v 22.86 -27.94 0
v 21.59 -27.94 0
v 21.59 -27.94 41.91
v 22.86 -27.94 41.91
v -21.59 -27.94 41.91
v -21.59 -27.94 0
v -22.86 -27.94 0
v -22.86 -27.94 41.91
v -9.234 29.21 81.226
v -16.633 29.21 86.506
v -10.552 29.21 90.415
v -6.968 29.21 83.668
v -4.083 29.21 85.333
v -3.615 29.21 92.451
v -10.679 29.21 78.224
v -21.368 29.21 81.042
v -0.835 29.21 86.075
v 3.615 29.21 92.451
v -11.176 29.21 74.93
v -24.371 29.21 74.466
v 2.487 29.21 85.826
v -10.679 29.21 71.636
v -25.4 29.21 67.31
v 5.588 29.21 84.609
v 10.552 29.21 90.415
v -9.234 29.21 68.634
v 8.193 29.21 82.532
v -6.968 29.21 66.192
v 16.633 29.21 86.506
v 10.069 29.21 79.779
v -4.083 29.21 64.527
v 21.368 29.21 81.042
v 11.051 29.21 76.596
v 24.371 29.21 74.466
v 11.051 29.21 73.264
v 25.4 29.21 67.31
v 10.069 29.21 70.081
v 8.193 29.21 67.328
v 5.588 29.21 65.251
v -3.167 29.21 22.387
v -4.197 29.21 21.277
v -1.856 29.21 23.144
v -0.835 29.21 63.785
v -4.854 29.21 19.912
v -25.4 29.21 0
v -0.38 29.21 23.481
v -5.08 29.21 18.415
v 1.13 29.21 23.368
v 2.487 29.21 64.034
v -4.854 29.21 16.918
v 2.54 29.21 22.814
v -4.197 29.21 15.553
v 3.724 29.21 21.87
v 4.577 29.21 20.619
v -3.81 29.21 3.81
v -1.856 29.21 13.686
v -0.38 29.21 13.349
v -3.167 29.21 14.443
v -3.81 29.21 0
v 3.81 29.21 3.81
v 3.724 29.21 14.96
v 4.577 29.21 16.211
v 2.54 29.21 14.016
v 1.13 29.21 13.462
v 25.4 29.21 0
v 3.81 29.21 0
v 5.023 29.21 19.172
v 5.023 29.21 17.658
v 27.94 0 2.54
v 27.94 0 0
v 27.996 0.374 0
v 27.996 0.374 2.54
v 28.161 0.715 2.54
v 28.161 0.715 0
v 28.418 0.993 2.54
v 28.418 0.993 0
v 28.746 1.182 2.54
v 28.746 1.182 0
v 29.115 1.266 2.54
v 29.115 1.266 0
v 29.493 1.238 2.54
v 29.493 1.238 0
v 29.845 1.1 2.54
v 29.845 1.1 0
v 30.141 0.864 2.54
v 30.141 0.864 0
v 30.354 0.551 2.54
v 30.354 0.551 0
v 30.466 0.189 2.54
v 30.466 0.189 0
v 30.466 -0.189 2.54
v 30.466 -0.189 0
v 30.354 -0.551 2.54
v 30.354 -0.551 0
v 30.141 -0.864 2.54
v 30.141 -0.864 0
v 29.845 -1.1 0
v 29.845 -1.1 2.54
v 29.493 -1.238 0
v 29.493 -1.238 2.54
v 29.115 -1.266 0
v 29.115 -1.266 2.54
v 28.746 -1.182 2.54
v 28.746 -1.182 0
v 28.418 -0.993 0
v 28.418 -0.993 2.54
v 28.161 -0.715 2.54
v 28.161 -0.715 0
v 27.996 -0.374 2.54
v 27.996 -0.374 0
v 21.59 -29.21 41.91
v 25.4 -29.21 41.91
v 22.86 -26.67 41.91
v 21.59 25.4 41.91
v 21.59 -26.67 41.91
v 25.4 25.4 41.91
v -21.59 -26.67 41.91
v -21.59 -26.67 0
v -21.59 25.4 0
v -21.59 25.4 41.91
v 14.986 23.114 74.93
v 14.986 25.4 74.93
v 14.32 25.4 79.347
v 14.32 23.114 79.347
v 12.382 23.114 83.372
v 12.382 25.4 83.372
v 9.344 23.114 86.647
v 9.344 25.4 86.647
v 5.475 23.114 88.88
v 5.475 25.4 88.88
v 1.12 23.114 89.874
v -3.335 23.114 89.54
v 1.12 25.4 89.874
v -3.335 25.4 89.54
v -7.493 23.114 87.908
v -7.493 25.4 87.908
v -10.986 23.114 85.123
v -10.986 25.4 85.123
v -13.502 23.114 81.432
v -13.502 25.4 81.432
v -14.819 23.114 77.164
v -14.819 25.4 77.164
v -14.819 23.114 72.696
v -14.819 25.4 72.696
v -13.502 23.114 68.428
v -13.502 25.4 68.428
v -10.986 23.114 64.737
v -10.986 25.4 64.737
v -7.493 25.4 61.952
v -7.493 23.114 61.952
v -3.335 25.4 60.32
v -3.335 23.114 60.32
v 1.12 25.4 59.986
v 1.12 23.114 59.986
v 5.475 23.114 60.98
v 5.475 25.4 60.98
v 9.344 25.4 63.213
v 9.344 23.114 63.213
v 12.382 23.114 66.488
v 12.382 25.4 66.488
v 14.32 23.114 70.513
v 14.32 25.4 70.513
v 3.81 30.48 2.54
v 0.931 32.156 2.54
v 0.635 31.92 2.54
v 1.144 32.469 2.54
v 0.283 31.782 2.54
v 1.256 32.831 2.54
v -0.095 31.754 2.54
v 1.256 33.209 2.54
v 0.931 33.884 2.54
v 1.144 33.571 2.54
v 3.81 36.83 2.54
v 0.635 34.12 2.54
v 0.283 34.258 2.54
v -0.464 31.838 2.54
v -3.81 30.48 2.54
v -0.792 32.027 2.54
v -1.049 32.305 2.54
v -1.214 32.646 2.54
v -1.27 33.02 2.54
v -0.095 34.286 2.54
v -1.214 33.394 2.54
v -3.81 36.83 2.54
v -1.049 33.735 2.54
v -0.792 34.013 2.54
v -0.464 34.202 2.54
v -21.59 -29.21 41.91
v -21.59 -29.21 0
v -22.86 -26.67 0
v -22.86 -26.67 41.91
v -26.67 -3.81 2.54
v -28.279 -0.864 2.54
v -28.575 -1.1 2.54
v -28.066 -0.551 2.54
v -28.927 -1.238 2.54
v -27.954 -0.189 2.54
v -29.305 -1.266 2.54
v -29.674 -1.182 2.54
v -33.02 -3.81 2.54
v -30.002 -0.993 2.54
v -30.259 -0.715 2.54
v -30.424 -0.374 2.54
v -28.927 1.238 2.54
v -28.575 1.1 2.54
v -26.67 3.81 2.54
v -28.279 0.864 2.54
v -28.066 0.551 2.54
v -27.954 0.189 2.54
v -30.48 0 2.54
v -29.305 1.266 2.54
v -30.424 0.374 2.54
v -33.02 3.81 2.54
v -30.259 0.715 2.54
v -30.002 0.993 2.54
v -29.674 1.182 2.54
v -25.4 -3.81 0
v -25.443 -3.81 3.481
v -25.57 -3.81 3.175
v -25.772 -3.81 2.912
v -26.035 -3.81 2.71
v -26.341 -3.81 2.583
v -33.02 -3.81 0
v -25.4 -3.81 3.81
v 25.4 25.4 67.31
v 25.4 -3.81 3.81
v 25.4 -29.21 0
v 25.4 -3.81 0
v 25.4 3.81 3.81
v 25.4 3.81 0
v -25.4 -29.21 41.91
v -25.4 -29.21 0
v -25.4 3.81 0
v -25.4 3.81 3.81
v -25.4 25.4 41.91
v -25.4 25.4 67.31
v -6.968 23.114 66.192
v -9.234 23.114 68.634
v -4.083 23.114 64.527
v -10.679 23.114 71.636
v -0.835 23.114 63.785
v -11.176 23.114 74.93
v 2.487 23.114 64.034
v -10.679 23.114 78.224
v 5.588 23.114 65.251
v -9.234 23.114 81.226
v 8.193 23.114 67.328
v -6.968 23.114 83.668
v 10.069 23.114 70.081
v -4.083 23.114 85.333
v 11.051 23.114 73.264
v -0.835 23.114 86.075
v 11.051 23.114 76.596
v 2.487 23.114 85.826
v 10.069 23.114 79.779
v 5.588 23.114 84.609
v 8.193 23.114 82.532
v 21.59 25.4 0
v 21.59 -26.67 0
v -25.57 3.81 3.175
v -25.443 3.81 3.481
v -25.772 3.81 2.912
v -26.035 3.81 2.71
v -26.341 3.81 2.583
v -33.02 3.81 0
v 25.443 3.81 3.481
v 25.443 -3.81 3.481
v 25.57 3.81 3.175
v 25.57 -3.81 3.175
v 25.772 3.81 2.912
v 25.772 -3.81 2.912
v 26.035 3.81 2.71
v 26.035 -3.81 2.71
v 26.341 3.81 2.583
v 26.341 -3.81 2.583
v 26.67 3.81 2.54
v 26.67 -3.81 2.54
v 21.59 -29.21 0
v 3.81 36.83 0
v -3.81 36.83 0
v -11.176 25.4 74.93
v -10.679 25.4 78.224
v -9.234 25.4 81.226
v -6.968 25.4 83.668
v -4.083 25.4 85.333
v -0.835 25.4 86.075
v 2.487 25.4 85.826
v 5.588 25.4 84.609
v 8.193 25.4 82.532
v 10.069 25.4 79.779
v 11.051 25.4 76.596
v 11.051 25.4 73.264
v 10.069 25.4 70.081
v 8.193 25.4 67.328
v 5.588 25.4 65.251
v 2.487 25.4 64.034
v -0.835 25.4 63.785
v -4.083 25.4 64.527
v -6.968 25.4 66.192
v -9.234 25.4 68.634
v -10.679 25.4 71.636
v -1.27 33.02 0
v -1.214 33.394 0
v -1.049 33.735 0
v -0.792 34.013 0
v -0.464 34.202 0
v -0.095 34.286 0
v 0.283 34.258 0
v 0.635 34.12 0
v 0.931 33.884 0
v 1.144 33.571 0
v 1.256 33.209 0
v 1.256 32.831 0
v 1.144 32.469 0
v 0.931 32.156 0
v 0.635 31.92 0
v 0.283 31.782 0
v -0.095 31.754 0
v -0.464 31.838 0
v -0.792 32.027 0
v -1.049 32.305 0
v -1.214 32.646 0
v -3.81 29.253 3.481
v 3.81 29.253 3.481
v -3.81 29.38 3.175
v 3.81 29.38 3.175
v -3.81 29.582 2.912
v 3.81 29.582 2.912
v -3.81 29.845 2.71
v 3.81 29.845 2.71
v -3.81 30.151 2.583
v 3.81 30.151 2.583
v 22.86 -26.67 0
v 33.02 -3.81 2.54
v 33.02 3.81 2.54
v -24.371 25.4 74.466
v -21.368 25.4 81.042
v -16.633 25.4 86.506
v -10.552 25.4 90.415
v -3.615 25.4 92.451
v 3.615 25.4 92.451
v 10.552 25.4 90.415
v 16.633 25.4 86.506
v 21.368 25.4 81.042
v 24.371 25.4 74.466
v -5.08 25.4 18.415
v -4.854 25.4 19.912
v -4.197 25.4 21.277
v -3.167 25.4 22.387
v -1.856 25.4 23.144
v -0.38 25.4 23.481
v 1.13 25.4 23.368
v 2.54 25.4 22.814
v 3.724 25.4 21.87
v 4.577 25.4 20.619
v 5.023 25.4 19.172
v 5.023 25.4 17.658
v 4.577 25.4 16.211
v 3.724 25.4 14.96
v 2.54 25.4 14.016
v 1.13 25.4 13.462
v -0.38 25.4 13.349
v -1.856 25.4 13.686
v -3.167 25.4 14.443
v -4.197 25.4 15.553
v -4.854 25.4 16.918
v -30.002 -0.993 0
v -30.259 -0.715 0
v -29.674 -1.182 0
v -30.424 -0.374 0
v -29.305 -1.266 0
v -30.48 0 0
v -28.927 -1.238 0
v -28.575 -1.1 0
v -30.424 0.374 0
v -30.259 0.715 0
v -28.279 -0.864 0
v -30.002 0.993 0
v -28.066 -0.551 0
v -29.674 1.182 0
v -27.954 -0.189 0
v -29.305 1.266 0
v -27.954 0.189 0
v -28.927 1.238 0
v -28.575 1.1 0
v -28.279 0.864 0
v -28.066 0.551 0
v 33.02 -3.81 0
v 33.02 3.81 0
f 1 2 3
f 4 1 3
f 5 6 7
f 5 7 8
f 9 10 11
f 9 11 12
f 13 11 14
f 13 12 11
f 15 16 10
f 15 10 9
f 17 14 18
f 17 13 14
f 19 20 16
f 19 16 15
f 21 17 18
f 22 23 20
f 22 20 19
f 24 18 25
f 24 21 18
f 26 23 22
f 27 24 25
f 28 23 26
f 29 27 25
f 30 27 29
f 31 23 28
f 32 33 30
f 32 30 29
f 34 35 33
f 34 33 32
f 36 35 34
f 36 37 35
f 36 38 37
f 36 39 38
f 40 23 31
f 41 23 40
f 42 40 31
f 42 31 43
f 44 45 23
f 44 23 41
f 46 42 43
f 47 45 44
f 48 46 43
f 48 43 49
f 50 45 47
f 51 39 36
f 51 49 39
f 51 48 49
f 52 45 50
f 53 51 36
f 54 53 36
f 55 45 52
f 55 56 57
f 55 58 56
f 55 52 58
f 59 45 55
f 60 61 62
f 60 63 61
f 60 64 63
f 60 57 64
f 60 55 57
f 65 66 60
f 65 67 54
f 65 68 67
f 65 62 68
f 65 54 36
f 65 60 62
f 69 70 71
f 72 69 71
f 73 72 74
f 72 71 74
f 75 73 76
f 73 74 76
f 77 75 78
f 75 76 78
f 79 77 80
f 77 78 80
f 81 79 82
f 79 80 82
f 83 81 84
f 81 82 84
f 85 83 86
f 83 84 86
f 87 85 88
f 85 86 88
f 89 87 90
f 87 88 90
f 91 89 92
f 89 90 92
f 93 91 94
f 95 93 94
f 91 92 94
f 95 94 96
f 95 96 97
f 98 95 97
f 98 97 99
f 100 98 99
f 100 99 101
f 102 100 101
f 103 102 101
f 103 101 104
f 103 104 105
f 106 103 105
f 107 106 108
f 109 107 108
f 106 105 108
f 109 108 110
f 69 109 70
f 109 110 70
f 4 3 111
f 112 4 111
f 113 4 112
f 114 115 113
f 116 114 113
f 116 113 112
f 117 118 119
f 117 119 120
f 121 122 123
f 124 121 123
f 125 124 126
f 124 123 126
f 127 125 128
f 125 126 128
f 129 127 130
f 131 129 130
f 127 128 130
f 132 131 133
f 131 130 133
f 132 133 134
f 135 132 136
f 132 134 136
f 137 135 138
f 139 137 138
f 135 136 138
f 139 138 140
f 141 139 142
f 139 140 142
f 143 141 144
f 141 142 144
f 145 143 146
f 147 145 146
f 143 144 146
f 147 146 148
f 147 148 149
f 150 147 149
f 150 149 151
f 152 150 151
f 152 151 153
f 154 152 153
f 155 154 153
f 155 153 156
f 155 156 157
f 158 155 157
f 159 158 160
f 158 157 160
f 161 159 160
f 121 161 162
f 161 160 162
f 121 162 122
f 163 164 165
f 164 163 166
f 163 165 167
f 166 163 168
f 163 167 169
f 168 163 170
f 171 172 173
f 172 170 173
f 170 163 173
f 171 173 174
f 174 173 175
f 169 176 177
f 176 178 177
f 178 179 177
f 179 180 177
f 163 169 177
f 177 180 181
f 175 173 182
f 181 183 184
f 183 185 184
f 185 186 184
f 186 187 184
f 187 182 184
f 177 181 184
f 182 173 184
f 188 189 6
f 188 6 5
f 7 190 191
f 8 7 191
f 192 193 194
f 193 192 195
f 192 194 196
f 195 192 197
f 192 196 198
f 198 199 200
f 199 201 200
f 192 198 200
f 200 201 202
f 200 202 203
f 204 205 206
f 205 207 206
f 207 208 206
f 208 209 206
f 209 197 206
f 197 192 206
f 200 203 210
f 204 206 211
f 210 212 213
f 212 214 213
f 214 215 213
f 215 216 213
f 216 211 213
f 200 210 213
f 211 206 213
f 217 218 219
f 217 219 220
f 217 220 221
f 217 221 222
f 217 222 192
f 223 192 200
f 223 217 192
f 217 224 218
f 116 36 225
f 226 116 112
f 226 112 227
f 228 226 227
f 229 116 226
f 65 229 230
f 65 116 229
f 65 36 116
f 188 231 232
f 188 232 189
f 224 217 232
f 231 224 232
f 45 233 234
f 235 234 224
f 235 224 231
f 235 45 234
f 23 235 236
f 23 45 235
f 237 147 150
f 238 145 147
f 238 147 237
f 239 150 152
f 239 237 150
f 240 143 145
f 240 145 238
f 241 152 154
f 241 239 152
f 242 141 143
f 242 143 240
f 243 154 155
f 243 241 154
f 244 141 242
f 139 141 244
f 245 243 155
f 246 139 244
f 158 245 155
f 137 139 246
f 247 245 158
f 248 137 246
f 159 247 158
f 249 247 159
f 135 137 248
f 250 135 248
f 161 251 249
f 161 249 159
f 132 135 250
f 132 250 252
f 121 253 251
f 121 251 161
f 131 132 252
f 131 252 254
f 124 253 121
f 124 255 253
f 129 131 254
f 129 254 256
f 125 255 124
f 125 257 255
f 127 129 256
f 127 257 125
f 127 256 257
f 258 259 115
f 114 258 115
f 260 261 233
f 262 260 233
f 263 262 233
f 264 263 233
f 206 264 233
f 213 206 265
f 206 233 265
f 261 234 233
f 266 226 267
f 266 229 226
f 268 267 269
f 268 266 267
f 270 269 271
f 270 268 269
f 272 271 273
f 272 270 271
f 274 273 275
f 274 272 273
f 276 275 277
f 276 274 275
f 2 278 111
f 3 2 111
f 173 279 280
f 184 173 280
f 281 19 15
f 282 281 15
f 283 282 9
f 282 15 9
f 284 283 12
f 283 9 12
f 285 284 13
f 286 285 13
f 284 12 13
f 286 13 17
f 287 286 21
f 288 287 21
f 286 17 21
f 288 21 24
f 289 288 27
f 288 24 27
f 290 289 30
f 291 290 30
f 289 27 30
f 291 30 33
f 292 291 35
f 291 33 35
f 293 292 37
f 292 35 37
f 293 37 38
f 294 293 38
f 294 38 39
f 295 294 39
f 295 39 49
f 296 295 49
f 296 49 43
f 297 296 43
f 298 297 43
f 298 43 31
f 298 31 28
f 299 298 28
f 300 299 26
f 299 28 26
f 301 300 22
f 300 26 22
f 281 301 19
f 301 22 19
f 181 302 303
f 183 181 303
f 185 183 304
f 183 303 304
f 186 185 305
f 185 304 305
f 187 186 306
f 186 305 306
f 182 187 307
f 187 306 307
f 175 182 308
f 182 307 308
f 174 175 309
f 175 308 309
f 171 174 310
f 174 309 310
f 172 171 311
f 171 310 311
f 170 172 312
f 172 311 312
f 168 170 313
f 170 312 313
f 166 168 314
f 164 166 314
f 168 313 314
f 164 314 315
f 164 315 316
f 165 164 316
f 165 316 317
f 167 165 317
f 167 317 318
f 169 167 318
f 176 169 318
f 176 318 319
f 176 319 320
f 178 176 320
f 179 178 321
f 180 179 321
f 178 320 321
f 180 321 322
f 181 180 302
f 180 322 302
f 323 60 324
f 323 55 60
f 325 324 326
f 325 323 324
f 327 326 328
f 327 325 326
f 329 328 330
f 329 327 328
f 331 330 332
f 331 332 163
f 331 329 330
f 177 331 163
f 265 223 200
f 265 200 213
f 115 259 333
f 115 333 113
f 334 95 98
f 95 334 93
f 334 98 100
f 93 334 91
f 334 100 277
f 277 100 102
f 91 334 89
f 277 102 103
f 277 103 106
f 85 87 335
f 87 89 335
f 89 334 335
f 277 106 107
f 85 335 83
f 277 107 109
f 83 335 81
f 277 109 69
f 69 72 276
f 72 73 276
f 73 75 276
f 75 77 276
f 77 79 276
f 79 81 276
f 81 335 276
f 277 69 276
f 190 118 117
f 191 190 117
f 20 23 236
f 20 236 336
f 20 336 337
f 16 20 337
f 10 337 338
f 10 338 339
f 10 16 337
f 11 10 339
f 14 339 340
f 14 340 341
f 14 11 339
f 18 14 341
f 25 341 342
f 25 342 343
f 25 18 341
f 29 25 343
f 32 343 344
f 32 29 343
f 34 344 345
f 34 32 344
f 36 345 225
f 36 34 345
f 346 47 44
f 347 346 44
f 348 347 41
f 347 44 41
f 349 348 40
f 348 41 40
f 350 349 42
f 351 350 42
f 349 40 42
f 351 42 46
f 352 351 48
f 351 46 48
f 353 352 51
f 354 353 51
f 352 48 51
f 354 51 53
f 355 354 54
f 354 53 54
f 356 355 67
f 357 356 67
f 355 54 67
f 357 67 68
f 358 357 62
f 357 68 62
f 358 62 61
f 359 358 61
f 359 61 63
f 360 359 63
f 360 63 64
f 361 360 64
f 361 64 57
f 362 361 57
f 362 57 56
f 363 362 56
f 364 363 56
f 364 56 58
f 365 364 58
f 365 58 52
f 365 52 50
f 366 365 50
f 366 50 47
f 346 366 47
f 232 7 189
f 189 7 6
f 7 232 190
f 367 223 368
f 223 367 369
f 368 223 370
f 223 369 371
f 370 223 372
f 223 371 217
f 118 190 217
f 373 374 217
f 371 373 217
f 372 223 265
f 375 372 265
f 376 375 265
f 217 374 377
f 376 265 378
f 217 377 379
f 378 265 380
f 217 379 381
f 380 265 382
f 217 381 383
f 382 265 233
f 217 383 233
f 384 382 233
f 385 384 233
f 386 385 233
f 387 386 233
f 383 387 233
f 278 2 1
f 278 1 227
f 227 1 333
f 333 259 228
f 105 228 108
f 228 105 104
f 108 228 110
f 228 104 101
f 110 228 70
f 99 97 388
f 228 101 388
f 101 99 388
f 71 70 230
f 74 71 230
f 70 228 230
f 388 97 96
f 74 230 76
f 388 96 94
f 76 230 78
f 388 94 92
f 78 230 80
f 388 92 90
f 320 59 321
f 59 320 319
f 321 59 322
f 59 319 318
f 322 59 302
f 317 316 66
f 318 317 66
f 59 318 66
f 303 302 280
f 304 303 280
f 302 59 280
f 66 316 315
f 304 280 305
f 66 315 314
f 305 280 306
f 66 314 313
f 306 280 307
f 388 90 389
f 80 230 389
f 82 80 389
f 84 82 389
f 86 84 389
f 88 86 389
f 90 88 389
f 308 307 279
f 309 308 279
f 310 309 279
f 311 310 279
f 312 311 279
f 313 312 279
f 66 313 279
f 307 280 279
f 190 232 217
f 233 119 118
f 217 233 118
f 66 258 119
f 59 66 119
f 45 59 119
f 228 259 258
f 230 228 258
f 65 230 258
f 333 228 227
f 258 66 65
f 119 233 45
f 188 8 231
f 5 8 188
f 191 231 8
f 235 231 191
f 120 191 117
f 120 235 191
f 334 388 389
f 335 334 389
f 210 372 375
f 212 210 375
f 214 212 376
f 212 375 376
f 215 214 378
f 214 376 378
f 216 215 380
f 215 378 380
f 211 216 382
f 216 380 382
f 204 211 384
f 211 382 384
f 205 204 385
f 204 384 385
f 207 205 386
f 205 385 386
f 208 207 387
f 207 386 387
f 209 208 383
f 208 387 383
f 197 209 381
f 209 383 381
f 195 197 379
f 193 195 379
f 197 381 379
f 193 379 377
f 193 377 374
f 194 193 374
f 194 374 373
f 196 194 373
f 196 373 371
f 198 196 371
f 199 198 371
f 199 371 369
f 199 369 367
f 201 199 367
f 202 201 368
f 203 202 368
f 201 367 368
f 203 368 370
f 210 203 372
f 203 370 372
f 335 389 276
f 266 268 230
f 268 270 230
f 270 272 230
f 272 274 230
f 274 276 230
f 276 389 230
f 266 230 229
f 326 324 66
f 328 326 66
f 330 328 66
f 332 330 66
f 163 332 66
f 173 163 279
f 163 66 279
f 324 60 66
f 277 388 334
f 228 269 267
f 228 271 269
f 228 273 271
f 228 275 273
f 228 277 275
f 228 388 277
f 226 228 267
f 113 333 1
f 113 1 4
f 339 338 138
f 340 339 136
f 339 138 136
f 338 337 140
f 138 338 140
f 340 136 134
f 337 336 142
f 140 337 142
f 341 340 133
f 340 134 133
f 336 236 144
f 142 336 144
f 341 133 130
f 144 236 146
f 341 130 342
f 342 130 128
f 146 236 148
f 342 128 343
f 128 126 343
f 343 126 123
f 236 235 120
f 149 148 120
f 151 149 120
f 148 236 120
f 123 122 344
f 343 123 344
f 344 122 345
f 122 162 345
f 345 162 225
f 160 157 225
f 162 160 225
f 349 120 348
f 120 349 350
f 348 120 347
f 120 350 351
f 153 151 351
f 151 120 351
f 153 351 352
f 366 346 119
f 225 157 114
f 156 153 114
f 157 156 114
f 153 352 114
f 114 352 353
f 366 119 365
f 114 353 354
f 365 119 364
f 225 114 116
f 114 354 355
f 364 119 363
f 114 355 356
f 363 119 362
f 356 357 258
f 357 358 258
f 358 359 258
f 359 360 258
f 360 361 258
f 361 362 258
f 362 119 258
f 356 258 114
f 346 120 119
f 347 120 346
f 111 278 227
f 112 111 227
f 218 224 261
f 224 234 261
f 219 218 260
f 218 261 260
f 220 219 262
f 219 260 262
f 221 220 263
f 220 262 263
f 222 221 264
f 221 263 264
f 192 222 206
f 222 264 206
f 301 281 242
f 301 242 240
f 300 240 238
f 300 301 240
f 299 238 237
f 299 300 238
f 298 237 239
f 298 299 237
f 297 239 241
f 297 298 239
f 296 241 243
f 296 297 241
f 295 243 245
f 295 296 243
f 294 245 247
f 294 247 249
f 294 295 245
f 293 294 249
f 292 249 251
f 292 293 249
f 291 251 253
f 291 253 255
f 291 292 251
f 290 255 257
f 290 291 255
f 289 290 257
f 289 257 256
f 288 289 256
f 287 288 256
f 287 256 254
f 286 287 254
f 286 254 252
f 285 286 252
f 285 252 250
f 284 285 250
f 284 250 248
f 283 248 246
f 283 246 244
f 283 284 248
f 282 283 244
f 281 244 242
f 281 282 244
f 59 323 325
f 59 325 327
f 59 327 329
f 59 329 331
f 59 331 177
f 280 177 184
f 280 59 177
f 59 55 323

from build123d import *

# Parameters (mm, degrees)
SKETCH1_W           = 50.8
SKETCH1_H           = 58.42
SKETCH1_W_2         = 43.18
SKETCH1_H_2         = 50.8
EXTRUDE_THIN1_DEPTH = 41.91
SKETCH2_R           = 5.08
CUT_EXTRUDE1_DEPTH  = 5.08
SKETCH3_W           = 43.18
SKETCH3_H           = 41.91
CUT_EXTRUDE2_DEPTH  = 5.08
SKETCH4_W           = 7.62
SKETCH4_H           = 7.62
SKETCH4_R           = 1.27
BOSS_EXTRUDE1_DEPTH = 2.54
SKETCH5_W           = 41.91
SKETCH5_H           = 1.27
CUT_EXTRUDE3_DEPTH  = 1.27
SKETCH6_R           = 11.176
BOSS_EXTRUDE2_DEPTH = 3.81
FILLET2_R           = 1.27
SKETCH7_R           = 14.986
SKETCH7_R_2         = 11.176
BOSS_EXTRUDE3_DEPTH = 2.286


with BuildPart() as part:
    # Sketch1 → Extrude-Thin1 (new body)
    with BuildSketch(Plane.XY):
        Rectangle(SKETCH1_W, SKETCH1_H)
        Rectangle(SKETCH1_W_2, SKETCH1_H_2, mode=Mode.SUBTRACT)
    extrude(amount=EXTRUDE_THIN1_DEPTH)

    # Sketch2 → Cut-Extrude1 (cut)
    with BuildSketch(Plane(origin=(0, 29.21, 0), x_dir=(1, 0, 0), z_dir=(0, 1, 0))):
        with Locations(Location((0, -18.415, 0), (0, 0, 180))):
            Circle(SKETCH2_R)
    extrude(amount=-CUT_EXTRUDE1_DEPTH, mode=Mode.SUBTRACT)

    # Sketch3 → Cut-Extrude2 (cut)
    with BuildSketch(Plane.XZ.offset(29.21)):
        with Locations((0, 20.955)):
            Rectangle(SKETCH3_W, SKETCH3_H)
    extrude(amount=-CUT_EXTRUDE2_DEPTH, mode=Mode.SUBTRACT)

    # Sketch4 → Boss-Extrude1 (add)
    # profile 1 of 3: a face of its own
    with BuildSketch(Plane(origin=(0, 0, 0), x_dir=(-1, 0, 0), z_dir=(0, 0, -1))):
        with Locations((29.21, 0)):
            Rectangle(SKETCH4_W, SKETCH4_H)
        with Locations((29.21, 0)):
            Circle(SKETCH4_R, mode=Mode.SUBTRACT)
    # profile 2 of 3: a face of its own
    with BuildSketch(Plane(origin=(0, 0, 0), x_dir=(-1, 0, 0), z_dir=(0, 0, -1))):
        with Locations((-29.21, 0)):
            Rectangle(SKETCH4_W, SKETCH4_H)
        with Locations((-29.21, 0)):
            Circle(SKETCH4_R, mode=Mode.SUBTRACT)
    # profile 3 of 3: a face of its own
    with BuildSketch(Plane(origin=(0, 0, 0), x_dir=(-1, 0, 0), z_dir=(0, 0, -1))):
        with Locations((0, 33.02)):
            Rectangle(SKETCH4_W, SKETCH4_H)
        with Locations((0, 33.02)):
            Circle(SKETCH4_R, mode=Mode.SUBTRACT)
    extrude(amount=-BOSS_EXTRUDE1_DEPTH)

    # Sketch5 → Cut-Extrude3 (cut)
    with BuildSketch(Plane.ZY.offset(-21.59)):
        with Locations((20.955, -27.305)):
            Rectangle(SKETCH5_W, SKETCH5_H)
    cut_extrude3 = extrude(amount=-CUT_EXTRUDE3_DEPTH, mode=Mode.SUBTRACT)

    # Mirror1: Cut-Extrude3 across plane
    add(cut_extrude3.mirror(Plane.ZY), mode=Mode.SUBTRACT)

    # Sketch6 → Boss-Extrude2 (add)
    with BuildSketch(Plane(origin=(0, 29.21, 0), x_dir=(1, 0, 0), z_dir=(0, 1, 0))):
        with BuildLine():
            Line((25.4, -67.31), (25.4, -41.91))
            Line((25.4, -41.91), (-25.4, -41.91))
            Line((-25.4, -41.91), (-25.4, -67.31))
            ThreePointArc((-25.4, -67.31), (0, -92.71), (25.4, -67.31))
        make_face()
        with Locations(Location((0, -74.93, 0), (0, 0, 180))):
            Circle(SKETCH6_R, mode=Mode.SUBTRACT)
    extrude(amount=-BOSS_EXTRUDE2_DEPTH)

    # Fillet2
    fillet2_edges = [part.edges().sort_by_distance(p)[0] for p in [
        (-25.4, 0, 2.54),
        (25.4, 0, 2.54),
        (0, 29.21, 2.54),
    ]]
    fillet(fillet2_edges, radius=FILLET2_R)

    # Sketch7 → Boss-Extrude3 (add)
    with BuildSketch(Plane.XZ.offset(-25.4)):
        with Locations((0, 74.93)):
            Circle(SKETCH7_R)
        with Locations(Location((0, 74.93, 0), (0, 0, 180))):
            Circle(SKETCH7_R_2, mode=Mode.SUBTRACT)
    extrude(amount=BOSS_EXTRUDE3_DEPTH)


solid = part.part
